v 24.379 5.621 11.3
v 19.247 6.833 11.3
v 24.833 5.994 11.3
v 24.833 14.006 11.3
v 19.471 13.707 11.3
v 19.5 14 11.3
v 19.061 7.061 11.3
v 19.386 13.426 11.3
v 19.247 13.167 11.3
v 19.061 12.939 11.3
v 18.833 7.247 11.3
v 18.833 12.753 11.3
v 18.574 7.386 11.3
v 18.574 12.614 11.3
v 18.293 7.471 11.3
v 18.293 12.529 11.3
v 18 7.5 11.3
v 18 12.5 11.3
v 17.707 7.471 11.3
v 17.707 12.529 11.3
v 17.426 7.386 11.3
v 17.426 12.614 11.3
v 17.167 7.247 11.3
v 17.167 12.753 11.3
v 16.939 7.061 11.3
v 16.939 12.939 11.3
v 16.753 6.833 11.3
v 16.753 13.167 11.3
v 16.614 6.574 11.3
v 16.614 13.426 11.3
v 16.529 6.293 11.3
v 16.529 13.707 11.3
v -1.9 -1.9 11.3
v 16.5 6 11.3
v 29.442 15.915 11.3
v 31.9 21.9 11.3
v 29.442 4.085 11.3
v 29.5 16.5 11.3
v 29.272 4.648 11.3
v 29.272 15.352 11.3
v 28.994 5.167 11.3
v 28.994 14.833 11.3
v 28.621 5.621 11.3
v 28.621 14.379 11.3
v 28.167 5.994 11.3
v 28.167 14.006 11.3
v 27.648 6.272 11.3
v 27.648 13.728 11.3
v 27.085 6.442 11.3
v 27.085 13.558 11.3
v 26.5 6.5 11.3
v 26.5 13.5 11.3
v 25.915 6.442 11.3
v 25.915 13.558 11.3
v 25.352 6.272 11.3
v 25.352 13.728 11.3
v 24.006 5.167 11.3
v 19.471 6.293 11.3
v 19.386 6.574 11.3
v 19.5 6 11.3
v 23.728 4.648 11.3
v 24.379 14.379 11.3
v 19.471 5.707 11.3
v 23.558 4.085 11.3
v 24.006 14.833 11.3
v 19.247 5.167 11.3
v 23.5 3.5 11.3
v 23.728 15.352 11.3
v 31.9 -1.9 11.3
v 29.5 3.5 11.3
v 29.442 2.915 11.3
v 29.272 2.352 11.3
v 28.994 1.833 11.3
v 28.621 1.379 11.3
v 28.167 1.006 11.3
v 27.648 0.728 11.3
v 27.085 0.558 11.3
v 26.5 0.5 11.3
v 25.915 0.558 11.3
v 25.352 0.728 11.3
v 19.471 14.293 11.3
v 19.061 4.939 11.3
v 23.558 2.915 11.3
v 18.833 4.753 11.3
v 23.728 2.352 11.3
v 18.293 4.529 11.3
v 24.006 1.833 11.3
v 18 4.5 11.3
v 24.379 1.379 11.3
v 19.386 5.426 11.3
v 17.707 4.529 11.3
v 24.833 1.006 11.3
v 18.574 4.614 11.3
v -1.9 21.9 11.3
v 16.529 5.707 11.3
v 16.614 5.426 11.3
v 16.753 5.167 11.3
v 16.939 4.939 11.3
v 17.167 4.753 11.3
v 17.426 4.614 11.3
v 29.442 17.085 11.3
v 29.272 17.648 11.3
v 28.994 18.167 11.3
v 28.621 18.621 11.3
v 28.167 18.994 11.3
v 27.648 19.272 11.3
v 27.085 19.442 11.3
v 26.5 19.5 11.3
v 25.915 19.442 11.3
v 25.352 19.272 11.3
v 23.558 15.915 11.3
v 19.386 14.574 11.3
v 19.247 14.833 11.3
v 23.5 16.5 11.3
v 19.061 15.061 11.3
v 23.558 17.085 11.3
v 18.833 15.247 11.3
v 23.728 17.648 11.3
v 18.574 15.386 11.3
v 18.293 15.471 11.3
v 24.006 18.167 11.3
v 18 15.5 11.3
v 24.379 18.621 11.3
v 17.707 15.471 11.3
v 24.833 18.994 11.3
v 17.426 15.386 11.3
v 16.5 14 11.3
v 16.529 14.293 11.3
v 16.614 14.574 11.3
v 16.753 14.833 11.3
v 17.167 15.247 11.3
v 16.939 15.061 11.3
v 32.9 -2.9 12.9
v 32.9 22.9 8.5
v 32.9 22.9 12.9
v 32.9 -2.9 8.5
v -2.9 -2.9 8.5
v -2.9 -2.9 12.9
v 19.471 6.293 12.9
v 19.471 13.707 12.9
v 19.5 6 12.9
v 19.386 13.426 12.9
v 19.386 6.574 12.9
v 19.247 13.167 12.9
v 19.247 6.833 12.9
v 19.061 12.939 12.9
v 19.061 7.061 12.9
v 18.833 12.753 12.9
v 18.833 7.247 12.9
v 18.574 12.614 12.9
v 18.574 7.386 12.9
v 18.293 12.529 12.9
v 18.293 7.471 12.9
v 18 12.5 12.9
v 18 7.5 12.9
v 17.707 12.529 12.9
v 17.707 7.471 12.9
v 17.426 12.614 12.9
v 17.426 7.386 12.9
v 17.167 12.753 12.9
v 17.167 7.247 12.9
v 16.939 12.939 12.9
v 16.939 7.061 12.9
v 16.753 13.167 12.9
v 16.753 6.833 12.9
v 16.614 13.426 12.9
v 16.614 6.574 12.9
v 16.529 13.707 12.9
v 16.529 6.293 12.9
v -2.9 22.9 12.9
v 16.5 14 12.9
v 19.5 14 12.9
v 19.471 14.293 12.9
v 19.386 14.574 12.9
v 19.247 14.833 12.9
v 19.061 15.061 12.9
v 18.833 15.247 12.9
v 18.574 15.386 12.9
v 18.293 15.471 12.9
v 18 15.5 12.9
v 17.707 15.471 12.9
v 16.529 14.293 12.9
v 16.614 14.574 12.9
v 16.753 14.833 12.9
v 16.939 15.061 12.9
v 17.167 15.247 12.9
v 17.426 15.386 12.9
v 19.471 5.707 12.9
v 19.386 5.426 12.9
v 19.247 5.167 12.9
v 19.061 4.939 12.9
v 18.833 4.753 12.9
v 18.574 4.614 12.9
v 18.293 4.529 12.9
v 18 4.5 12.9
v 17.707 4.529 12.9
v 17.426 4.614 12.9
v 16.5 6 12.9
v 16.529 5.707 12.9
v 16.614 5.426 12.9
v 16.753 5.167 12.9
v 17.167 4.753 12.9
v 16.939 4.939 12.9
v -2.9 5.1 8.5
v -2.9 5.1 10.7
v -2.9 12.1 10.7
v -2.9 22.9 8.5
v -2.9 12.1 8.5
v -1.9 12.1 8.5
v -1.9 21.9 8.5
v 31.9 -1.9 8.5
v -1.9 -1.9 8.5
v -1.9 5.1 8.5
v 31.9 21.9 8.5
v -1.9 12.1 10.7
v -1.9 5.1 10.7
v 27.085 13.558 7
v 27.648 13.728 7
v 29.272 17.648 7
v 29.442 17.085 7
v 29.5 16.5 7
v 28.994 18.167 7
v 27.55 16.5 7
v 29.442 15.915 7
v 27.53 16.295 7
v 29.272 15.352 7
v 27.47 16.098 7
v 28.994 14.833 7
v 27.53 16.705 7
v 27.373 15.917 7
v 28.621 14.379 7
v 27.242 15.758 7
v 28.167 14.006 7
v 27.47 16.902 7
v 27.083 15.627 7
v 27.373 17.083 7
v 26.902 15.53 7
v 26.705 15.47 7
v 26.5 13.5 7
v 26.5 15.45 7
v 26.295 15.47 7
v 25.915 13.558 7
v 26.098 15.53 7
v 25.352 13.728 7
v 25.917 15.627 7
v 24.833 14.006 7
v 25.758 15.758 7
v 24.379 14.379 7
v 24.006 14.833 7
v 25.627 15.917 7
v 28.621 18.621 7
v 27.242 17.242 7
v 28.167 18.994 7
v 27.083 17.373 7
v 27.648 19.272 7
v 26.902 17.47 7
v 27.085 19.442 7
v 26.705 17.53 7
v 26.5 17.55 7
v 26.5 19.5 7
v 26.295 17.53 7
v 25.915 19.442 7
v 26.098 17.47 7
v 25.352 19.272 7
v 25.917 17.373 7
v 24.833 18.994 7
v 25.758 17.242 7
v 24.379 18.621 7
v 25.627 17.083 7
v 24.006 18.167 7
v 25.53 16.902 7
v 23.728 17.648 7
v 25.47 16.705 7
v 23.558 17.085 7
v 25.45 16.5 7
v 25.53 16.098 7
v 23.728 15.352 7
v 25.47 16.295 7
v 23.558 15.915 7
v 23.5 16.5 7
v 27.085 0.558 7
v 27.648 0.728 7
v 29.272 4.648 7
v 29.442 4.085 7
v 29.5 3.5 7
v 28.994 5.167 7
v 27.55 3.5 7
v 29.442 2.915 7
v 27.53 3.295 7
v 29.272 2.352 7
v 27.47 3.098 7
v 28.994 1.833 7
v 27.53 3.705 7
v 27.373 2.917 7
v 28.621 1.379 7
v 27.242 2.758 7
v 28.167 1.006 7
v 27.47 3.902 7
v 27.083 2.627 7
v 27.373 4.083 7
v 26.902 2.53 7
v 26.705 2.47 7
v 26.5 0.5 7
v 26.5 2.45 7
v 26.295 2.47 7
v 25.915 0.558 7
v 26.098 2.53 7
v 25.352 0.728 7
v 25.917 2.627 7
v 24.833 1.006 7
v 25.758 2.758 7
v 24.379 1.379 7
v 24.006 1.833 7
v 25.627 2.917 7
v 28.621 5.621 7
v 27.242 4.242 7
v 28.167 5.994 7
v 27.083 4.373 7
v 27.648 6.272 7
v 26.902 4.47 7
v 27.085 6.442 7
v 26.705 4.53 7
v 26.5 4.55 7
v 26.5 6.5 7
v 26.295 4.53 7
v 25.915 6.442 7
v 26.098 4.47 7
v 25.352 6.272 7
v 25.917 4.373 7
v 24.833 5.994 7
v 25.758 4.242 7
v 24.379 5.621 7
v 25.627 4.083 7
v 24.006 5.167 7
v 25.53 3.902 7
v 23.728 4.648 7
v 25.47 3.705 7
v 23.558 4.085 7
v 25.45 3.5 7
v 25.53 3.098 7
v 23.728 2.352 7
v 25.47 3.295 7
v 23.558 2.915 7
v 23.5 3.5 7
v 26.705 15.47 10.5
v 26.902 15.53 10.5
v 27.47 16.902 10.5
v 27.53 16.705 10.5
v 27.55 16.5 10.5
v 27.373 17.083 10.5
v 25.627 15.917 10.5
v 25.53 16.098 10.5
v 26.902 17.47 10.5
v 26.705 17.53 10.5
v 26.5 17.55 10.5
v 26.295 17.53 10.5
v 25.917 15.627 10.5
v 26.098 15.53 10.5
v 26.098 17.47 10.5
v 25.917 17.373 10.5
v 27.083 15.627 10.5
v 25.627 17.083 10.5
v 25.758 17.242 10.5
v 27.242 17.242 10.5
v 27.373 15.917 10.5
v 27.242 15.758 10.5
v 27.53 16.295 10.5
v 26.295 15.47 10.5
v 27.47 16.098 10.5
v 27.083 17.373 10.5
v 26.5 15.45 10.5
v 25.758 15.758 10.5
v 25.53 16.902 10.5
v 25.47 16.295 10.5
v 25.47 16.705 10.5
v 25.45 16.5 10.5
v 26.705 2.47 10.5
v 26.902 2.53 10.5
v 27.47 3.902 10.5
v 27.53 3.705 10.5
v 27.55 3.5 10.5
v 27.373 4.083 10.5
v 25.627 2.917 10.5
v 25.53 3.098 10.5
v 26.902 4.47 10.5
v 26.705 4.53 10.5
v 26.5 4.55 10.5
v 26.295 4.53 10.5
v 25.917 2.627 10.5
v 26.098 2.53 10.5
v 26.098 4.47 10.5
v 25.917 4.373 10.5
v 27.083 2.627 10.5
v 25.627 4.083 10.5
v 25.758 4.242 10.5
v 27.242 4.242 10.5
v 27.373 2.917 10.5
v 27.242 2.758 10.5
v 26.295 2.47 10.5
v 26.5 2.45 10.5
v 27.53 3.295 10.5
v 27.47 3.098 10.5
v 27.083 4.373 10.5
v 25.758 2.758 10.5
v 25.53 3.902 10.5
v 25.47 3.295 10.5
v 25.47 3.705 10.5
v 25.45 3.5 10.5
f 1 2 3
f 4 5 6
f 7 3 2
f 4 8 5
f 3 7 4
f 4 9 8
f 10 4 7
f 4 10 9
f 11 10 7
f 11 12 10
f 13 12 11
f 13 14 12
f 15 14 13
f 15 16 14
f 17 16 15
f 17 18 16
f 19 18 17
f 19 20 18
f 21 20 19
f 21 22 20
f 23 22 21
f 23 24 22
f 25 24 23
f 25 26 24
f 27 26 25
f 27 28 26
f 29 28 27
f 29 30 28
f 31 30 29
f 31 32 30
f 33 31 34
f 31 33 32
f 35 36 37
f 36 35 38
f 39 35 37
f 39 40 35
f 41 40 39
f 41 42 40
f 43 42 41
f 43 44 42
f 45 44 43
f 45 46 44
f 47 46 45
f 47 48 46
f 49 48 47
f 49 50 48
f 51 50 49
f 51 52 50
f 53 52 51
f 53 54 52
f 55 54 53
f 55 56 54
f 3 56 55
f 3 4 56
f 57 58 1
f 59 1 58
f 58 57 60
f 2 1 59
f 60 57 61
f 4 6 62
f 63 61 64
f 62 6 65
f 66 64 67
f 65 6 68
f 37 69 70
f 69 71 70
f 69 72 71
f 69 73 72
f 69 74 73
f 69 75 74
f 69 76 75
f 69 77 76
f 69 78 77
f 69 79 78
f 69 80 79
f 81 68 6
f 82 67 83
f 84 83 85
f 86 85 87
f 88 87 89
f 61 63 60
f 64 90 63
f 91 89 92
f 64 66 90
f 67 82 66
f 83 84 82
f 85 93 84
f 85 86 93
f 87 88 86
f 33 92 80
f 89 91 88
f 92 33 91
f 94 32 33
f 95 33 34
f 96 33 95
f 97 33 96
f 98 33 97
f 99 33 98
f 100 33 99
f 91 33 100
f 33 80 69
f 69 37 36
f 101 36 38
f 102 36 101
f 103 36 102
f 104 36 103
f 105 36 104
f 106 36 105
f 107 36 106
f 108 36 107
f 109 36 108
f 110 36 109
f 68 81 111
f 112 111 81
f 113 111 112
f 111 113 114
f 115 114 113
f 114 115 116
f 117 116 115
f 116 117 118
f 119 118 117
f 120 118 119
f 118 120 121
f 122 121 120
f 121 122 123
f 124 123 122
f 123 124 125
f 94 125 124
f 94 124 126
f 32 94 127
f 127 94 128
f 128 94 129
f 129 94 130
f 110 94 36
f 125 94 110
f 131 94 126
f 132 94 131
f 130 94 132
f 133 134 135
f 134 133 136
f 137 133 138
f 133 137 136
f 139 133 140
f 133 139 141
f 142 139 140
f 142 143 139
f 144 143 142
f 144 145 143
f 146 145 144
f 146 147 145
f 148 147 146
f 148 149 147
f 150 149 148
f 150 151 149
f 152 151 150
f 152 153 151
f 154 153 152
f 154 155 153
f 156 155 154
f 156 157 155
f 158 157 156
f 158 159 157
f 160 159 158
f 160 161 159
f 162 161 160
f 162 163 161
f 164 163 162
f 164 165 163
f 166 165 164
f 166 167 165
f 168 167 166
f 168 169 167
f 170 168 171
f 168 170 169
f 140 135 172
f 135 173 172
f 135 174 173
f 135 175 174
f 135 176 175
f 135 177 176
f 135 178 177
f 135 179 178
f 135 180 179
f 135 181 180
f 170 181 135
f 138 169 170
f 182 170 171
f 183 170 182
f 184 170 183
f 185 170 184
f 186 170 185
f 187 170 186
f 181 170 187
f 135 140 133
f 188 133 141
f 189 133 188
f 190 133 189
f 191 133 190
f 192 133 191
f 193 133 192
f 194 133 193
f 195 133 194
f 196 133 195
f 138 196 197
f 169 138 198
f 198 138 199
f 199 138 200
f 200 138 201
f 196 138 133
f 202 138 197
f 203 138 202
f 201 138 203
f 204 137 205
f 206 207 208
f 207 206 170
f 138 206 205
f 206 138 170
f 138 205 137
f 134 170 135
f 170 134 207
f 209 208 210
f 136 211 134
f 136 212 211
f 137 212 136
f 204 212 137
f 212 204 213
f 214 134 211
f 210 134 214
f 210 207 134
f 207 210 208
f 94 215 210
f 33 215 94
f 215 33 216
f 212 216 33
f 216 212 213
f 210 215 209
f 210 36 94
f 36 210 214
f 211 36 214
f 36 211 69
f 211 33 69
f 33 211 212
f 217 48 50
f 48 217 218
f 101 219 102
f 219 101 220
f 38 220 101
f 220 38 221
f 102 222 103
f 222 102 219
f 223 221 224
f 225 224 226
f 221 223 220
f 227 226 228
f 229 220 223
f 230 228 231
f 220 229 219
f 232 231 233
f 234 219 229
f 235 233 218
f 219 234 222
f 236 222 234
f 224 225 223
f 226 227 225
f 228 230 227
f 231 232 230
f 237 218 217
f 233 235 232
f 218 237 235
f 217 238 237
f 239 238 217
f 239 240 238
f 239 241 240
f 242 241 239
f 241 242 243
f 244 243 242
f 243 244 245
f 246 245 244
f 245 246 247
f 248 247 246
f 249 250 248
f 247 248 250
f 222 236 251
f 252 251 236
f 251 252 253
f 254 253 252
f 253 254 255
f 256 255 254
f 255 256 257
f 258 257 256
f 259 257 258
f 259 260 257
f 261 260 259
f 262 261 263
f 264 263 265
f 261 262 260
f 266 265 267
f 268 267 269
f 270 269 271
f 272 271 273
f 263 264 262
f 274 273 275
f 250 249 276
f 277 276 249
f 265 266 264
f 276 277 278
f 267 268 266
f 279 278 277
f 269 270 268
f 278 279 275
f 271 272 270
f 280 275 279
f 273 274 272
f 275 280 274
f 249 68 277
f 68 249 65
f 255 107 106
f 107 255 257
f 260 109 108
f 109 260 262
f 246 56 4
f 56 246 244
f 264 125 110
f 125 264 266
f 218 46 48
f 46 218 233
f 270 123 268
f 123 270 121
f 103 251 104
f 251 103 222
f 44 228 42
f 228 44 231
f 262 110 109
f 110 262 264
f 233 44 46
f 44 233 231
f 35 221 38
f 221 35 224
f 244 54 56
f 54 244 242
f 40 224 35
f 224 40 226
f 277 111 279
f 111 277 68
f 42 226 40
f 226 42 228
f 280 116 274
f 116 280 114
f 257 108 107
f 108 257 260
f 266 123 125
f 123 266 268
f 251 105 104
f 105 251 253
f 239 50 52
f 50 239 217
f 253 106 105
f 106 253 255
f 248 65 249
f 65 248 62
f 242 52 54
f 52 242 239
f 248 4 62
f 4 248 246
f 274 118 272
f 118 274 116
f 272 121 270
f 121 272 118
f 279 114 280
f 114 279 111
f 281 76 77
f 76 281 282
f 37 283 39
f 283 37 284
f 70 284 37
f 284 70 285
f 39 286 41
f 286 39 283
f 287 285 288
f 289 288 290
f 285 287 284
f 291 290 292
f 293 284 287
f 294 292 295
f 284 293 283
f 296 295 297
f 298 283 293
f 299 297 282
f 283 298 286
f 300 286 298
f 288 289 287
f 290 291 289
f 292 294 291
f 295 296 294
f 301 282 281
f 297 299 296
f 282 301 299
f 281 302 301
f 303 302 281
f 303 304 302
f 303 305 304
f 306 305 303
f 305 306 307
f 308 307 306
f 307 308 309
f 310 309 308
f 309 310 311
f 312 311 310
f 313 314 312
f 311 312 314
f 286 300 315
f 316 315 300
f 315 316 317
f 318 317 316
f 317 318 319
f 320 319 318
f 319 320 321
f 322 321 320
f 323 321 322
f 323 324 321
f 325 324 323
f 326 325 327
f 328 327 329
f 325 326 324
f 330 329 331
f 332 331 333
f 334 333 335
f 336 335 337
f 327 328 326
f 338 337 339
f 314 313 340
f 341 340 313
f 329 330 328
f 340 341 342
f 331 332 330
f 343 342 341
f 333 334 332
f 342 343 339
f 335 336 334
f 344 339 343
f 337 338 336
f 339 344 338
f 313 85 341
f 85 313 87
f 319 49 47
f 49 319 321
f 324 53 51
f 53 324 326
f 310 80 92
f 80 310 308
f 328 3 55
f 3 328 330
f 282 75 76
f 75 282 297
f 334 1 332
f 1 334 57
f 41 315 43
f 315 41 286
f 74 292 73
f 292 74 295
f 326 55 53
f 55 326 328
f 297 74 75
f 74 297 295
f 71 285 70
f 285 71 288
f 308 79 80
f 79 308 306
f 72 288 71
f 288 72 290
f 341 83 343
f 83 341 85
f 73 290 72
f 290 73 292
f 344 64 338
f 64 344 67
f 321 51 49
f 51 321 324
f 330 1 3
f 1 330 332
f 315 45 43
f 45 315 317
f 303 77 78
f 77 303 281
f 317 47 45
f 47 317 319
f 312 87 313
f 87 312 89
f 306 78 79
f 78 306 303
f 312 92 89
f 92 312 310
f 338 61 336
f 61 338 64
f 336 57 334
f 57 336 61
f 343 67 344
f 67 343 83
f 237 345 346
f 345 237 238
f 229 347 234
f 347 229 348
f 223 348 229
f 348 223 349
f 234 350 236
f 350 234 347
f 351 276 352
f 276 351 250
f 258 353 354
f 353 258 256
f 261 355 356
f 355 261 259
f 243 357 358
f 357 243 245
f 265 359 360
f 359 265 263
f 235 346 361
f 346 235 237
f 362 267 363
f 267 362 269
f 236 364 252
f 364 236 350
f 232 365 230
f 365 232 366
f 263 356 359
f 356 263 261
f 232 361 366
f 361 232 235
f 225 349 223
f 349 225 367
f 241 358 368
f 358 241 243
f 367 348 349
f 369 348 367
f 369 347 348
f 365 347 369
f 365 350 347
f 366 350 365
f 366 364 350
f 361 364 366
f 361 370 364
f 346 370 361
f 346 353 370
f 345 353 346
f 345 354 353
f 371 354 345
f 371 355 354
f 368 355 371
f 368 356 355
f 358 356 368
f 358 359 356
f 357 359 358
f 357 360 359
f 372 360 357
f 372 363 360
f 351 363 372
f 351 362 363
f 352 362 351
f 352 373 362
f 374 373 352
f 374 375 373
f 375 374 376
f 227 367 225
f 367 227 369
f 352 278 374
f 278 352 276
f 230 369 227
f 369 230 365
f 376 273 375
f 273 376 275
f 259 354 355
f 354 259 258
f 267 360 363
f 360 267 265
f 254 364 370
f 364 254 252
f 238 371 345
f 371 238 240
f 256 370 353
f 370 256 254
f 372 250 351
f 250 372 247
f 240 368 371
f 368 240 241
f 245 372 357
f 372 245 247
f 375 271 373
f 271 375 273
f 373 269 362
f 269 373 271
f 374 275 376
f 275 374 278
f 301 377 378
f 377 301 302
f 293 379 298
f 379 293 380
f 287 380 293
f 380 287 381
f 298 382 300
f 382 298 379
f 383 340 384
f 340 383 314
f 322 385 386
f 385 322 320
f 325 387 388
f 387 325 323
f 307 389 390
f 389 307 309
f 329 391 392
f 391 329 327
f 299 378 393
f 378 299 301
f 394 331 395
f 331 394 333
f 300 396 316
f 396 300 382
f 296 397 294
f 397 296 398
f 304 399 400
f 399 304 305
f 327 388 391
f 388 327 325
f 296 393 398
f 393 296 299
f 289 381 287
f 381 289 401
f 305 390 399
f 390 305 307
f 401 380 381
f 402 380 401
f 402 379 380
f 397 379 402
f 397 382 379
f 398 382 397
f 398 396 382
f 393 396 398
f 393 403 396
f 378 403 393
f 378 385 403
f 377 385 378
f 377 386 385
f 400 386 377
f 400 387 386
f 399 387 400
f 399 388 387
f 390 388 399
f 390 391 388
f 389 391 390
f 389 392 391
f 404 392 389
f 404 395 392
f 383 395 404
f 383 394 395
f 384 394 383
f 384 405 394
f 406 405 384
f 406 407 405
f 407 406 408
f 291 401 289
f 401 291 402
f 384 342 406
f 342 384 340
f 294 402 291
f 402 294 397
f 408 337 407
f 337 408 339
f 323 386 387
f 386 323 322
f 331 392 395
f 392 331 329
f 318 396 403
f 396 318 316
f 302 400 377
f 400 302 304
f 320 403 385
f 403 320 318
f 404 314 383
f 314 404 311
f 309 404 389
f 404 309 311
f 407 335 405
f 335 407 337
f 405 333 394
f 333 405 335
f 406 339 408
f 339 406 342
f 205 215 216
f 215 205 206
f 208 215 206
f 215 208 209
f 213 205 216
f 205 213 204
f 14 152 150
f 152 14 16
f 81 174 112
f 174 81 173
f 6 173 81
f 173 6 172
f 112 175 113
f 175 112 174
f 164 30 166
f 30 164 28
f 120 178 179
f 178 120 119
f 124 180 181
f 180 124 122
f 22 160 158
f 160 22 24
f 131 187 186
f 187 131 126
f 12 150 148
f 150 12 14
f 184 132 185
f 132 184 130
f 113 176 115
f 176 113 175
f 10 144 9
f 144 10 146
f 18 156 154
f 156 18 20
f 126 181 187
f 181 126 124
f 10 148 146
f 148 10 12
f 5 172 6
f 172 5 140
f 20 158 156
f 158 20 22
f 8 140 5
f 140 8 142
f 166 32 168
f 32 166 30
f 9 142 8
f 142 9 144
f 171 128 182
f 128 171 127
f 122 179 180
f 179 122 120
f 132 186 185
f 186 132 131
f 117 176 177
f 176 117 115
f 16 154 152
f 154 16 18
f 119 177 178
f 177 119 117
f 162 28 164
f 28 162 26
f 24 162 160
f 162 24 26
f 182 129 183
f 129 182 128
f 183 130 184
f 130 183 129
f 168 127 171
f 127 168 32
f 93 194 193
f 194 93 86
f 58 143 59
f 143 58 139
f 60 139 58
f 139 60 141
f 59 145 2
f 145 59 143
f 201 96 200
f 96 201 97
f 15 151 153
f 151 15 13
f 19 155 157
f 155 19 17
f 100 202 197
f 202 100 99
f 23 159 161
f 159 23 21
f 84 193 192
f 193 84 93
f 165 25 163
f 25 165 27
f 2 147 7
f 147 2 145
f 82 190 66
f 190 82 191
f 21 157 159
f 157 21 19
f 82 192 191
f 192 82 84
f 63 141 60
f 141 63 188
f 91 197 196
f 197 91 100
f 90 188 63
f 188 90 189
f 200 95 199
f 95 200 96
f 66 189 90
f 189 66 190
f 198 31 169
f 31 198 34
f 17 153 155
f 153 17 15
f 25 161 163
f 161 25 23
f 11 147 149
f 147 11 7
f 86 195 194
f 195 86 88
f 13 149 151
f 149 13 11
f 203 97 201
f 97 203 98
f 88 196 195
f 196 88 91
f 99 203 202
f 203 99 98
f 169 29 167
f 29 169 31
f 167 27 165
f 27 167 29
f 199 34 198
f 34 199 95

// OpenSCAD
// The lid of the housing "usbc_screwed", written by enclosure-nv 0.1.0
// from the board file usbc_board.kicad_pcb.  Render with OpenSCAD.
// Parameters, in millimetres.  The same block heads every file of this housing:
// when a value is changed, change it in each file.
wall = 2.4;
floor_t = 2.4;
lid_t = 1.6;
clear = 0.5;  // the board's edge to the inside of the wall
standoff_d = 6;
screw_d = 2.5;
pilot_d = 2.1;
head_d = 5;
head_h = 1.6;
lip_h = 3;  // the height of the step the lid sits on
lid_gap = 0.2;
snap_depth = 0.4;
snap_h = 0.8;
led_d = 3;
button_d = 3;
board_t = 1.6;
standoff_h = 3;  // the space under the board
top_space = 4.3;  // the space above the board
pilot_len = 3.5;  // the depth of the screw's hole
print_flip = false;  // true lays the lid plate down

// Levels along z.
z_bb = floor_t + standoff_h;
z_bt = z_bb + board_t;
z_split = z_bt + top_space;
z_step = z_split - lip_h;
z_top = z_split + lid_t;
z_skirt = z_step + lid_gap;
a_in = wall / 2;
screw_clear = screw_d + 0.3;

module outline() {
  polygon(points = [[0, 0], [30, 0], [30, 20], [0, 20]]);
}

module lid() {
  difference() {
    union() {
      // the plate
      translate([0, 0, z_split]) linear_extrude(height = lid_t) offset(delta = clear + wall) outline();
      // the skirt that takes the place of the outer half of the wall
      translate([0, 0, z_skirt]) linear_extrude(height = z_split - z_skirt + 0.2) difference() {
        offset(delta = clear + wall) outline();
        offset(delta = clear + a_in + lid_gap) outline();
      }
      // the pillars the screws turn into
      translate([26.5, 16.5, z_bt]) cylinder(h = z_split - z_bt + 0.2, d = standoff_d, $fn = 32);
      translate([26.5, 3.5, z_bt]) cylinder(h = z_split - z_bt + 0.2, d = standoff_d, $fn = 32);
    }
    // the screws' holes
    translate([26.5, 16.5, z_bt - 1]) cylinder(h = pilot_len + 1, d = pilot_d, $fn = 32);
    translate([26.5, 3.5, z_bt - 1]) cylinder(h = pilot_len + 1, d = pilot_d, $fn = 32);
    // the openings
    translate([0, 8.6, z_bt + (-0.4)]) rotate([0, 0, 180]) translate([-1, -3.5, 0]) cube([clear + wall + 2, 7, 4.1]);
    translate([18, 14, z_split - 1]) cylinder(h = lid_t + 2, d = 3, $fn = 32);
    translate([18, 6, z_split - 1]) cylinder(h = lid_t + 2, d = 3, $fn = 32);
  }
}

if (print_flip) {
  translate([0, 20, z_top]) rotate([180, 0, 0]) lid();
} else {
  lid();
}
